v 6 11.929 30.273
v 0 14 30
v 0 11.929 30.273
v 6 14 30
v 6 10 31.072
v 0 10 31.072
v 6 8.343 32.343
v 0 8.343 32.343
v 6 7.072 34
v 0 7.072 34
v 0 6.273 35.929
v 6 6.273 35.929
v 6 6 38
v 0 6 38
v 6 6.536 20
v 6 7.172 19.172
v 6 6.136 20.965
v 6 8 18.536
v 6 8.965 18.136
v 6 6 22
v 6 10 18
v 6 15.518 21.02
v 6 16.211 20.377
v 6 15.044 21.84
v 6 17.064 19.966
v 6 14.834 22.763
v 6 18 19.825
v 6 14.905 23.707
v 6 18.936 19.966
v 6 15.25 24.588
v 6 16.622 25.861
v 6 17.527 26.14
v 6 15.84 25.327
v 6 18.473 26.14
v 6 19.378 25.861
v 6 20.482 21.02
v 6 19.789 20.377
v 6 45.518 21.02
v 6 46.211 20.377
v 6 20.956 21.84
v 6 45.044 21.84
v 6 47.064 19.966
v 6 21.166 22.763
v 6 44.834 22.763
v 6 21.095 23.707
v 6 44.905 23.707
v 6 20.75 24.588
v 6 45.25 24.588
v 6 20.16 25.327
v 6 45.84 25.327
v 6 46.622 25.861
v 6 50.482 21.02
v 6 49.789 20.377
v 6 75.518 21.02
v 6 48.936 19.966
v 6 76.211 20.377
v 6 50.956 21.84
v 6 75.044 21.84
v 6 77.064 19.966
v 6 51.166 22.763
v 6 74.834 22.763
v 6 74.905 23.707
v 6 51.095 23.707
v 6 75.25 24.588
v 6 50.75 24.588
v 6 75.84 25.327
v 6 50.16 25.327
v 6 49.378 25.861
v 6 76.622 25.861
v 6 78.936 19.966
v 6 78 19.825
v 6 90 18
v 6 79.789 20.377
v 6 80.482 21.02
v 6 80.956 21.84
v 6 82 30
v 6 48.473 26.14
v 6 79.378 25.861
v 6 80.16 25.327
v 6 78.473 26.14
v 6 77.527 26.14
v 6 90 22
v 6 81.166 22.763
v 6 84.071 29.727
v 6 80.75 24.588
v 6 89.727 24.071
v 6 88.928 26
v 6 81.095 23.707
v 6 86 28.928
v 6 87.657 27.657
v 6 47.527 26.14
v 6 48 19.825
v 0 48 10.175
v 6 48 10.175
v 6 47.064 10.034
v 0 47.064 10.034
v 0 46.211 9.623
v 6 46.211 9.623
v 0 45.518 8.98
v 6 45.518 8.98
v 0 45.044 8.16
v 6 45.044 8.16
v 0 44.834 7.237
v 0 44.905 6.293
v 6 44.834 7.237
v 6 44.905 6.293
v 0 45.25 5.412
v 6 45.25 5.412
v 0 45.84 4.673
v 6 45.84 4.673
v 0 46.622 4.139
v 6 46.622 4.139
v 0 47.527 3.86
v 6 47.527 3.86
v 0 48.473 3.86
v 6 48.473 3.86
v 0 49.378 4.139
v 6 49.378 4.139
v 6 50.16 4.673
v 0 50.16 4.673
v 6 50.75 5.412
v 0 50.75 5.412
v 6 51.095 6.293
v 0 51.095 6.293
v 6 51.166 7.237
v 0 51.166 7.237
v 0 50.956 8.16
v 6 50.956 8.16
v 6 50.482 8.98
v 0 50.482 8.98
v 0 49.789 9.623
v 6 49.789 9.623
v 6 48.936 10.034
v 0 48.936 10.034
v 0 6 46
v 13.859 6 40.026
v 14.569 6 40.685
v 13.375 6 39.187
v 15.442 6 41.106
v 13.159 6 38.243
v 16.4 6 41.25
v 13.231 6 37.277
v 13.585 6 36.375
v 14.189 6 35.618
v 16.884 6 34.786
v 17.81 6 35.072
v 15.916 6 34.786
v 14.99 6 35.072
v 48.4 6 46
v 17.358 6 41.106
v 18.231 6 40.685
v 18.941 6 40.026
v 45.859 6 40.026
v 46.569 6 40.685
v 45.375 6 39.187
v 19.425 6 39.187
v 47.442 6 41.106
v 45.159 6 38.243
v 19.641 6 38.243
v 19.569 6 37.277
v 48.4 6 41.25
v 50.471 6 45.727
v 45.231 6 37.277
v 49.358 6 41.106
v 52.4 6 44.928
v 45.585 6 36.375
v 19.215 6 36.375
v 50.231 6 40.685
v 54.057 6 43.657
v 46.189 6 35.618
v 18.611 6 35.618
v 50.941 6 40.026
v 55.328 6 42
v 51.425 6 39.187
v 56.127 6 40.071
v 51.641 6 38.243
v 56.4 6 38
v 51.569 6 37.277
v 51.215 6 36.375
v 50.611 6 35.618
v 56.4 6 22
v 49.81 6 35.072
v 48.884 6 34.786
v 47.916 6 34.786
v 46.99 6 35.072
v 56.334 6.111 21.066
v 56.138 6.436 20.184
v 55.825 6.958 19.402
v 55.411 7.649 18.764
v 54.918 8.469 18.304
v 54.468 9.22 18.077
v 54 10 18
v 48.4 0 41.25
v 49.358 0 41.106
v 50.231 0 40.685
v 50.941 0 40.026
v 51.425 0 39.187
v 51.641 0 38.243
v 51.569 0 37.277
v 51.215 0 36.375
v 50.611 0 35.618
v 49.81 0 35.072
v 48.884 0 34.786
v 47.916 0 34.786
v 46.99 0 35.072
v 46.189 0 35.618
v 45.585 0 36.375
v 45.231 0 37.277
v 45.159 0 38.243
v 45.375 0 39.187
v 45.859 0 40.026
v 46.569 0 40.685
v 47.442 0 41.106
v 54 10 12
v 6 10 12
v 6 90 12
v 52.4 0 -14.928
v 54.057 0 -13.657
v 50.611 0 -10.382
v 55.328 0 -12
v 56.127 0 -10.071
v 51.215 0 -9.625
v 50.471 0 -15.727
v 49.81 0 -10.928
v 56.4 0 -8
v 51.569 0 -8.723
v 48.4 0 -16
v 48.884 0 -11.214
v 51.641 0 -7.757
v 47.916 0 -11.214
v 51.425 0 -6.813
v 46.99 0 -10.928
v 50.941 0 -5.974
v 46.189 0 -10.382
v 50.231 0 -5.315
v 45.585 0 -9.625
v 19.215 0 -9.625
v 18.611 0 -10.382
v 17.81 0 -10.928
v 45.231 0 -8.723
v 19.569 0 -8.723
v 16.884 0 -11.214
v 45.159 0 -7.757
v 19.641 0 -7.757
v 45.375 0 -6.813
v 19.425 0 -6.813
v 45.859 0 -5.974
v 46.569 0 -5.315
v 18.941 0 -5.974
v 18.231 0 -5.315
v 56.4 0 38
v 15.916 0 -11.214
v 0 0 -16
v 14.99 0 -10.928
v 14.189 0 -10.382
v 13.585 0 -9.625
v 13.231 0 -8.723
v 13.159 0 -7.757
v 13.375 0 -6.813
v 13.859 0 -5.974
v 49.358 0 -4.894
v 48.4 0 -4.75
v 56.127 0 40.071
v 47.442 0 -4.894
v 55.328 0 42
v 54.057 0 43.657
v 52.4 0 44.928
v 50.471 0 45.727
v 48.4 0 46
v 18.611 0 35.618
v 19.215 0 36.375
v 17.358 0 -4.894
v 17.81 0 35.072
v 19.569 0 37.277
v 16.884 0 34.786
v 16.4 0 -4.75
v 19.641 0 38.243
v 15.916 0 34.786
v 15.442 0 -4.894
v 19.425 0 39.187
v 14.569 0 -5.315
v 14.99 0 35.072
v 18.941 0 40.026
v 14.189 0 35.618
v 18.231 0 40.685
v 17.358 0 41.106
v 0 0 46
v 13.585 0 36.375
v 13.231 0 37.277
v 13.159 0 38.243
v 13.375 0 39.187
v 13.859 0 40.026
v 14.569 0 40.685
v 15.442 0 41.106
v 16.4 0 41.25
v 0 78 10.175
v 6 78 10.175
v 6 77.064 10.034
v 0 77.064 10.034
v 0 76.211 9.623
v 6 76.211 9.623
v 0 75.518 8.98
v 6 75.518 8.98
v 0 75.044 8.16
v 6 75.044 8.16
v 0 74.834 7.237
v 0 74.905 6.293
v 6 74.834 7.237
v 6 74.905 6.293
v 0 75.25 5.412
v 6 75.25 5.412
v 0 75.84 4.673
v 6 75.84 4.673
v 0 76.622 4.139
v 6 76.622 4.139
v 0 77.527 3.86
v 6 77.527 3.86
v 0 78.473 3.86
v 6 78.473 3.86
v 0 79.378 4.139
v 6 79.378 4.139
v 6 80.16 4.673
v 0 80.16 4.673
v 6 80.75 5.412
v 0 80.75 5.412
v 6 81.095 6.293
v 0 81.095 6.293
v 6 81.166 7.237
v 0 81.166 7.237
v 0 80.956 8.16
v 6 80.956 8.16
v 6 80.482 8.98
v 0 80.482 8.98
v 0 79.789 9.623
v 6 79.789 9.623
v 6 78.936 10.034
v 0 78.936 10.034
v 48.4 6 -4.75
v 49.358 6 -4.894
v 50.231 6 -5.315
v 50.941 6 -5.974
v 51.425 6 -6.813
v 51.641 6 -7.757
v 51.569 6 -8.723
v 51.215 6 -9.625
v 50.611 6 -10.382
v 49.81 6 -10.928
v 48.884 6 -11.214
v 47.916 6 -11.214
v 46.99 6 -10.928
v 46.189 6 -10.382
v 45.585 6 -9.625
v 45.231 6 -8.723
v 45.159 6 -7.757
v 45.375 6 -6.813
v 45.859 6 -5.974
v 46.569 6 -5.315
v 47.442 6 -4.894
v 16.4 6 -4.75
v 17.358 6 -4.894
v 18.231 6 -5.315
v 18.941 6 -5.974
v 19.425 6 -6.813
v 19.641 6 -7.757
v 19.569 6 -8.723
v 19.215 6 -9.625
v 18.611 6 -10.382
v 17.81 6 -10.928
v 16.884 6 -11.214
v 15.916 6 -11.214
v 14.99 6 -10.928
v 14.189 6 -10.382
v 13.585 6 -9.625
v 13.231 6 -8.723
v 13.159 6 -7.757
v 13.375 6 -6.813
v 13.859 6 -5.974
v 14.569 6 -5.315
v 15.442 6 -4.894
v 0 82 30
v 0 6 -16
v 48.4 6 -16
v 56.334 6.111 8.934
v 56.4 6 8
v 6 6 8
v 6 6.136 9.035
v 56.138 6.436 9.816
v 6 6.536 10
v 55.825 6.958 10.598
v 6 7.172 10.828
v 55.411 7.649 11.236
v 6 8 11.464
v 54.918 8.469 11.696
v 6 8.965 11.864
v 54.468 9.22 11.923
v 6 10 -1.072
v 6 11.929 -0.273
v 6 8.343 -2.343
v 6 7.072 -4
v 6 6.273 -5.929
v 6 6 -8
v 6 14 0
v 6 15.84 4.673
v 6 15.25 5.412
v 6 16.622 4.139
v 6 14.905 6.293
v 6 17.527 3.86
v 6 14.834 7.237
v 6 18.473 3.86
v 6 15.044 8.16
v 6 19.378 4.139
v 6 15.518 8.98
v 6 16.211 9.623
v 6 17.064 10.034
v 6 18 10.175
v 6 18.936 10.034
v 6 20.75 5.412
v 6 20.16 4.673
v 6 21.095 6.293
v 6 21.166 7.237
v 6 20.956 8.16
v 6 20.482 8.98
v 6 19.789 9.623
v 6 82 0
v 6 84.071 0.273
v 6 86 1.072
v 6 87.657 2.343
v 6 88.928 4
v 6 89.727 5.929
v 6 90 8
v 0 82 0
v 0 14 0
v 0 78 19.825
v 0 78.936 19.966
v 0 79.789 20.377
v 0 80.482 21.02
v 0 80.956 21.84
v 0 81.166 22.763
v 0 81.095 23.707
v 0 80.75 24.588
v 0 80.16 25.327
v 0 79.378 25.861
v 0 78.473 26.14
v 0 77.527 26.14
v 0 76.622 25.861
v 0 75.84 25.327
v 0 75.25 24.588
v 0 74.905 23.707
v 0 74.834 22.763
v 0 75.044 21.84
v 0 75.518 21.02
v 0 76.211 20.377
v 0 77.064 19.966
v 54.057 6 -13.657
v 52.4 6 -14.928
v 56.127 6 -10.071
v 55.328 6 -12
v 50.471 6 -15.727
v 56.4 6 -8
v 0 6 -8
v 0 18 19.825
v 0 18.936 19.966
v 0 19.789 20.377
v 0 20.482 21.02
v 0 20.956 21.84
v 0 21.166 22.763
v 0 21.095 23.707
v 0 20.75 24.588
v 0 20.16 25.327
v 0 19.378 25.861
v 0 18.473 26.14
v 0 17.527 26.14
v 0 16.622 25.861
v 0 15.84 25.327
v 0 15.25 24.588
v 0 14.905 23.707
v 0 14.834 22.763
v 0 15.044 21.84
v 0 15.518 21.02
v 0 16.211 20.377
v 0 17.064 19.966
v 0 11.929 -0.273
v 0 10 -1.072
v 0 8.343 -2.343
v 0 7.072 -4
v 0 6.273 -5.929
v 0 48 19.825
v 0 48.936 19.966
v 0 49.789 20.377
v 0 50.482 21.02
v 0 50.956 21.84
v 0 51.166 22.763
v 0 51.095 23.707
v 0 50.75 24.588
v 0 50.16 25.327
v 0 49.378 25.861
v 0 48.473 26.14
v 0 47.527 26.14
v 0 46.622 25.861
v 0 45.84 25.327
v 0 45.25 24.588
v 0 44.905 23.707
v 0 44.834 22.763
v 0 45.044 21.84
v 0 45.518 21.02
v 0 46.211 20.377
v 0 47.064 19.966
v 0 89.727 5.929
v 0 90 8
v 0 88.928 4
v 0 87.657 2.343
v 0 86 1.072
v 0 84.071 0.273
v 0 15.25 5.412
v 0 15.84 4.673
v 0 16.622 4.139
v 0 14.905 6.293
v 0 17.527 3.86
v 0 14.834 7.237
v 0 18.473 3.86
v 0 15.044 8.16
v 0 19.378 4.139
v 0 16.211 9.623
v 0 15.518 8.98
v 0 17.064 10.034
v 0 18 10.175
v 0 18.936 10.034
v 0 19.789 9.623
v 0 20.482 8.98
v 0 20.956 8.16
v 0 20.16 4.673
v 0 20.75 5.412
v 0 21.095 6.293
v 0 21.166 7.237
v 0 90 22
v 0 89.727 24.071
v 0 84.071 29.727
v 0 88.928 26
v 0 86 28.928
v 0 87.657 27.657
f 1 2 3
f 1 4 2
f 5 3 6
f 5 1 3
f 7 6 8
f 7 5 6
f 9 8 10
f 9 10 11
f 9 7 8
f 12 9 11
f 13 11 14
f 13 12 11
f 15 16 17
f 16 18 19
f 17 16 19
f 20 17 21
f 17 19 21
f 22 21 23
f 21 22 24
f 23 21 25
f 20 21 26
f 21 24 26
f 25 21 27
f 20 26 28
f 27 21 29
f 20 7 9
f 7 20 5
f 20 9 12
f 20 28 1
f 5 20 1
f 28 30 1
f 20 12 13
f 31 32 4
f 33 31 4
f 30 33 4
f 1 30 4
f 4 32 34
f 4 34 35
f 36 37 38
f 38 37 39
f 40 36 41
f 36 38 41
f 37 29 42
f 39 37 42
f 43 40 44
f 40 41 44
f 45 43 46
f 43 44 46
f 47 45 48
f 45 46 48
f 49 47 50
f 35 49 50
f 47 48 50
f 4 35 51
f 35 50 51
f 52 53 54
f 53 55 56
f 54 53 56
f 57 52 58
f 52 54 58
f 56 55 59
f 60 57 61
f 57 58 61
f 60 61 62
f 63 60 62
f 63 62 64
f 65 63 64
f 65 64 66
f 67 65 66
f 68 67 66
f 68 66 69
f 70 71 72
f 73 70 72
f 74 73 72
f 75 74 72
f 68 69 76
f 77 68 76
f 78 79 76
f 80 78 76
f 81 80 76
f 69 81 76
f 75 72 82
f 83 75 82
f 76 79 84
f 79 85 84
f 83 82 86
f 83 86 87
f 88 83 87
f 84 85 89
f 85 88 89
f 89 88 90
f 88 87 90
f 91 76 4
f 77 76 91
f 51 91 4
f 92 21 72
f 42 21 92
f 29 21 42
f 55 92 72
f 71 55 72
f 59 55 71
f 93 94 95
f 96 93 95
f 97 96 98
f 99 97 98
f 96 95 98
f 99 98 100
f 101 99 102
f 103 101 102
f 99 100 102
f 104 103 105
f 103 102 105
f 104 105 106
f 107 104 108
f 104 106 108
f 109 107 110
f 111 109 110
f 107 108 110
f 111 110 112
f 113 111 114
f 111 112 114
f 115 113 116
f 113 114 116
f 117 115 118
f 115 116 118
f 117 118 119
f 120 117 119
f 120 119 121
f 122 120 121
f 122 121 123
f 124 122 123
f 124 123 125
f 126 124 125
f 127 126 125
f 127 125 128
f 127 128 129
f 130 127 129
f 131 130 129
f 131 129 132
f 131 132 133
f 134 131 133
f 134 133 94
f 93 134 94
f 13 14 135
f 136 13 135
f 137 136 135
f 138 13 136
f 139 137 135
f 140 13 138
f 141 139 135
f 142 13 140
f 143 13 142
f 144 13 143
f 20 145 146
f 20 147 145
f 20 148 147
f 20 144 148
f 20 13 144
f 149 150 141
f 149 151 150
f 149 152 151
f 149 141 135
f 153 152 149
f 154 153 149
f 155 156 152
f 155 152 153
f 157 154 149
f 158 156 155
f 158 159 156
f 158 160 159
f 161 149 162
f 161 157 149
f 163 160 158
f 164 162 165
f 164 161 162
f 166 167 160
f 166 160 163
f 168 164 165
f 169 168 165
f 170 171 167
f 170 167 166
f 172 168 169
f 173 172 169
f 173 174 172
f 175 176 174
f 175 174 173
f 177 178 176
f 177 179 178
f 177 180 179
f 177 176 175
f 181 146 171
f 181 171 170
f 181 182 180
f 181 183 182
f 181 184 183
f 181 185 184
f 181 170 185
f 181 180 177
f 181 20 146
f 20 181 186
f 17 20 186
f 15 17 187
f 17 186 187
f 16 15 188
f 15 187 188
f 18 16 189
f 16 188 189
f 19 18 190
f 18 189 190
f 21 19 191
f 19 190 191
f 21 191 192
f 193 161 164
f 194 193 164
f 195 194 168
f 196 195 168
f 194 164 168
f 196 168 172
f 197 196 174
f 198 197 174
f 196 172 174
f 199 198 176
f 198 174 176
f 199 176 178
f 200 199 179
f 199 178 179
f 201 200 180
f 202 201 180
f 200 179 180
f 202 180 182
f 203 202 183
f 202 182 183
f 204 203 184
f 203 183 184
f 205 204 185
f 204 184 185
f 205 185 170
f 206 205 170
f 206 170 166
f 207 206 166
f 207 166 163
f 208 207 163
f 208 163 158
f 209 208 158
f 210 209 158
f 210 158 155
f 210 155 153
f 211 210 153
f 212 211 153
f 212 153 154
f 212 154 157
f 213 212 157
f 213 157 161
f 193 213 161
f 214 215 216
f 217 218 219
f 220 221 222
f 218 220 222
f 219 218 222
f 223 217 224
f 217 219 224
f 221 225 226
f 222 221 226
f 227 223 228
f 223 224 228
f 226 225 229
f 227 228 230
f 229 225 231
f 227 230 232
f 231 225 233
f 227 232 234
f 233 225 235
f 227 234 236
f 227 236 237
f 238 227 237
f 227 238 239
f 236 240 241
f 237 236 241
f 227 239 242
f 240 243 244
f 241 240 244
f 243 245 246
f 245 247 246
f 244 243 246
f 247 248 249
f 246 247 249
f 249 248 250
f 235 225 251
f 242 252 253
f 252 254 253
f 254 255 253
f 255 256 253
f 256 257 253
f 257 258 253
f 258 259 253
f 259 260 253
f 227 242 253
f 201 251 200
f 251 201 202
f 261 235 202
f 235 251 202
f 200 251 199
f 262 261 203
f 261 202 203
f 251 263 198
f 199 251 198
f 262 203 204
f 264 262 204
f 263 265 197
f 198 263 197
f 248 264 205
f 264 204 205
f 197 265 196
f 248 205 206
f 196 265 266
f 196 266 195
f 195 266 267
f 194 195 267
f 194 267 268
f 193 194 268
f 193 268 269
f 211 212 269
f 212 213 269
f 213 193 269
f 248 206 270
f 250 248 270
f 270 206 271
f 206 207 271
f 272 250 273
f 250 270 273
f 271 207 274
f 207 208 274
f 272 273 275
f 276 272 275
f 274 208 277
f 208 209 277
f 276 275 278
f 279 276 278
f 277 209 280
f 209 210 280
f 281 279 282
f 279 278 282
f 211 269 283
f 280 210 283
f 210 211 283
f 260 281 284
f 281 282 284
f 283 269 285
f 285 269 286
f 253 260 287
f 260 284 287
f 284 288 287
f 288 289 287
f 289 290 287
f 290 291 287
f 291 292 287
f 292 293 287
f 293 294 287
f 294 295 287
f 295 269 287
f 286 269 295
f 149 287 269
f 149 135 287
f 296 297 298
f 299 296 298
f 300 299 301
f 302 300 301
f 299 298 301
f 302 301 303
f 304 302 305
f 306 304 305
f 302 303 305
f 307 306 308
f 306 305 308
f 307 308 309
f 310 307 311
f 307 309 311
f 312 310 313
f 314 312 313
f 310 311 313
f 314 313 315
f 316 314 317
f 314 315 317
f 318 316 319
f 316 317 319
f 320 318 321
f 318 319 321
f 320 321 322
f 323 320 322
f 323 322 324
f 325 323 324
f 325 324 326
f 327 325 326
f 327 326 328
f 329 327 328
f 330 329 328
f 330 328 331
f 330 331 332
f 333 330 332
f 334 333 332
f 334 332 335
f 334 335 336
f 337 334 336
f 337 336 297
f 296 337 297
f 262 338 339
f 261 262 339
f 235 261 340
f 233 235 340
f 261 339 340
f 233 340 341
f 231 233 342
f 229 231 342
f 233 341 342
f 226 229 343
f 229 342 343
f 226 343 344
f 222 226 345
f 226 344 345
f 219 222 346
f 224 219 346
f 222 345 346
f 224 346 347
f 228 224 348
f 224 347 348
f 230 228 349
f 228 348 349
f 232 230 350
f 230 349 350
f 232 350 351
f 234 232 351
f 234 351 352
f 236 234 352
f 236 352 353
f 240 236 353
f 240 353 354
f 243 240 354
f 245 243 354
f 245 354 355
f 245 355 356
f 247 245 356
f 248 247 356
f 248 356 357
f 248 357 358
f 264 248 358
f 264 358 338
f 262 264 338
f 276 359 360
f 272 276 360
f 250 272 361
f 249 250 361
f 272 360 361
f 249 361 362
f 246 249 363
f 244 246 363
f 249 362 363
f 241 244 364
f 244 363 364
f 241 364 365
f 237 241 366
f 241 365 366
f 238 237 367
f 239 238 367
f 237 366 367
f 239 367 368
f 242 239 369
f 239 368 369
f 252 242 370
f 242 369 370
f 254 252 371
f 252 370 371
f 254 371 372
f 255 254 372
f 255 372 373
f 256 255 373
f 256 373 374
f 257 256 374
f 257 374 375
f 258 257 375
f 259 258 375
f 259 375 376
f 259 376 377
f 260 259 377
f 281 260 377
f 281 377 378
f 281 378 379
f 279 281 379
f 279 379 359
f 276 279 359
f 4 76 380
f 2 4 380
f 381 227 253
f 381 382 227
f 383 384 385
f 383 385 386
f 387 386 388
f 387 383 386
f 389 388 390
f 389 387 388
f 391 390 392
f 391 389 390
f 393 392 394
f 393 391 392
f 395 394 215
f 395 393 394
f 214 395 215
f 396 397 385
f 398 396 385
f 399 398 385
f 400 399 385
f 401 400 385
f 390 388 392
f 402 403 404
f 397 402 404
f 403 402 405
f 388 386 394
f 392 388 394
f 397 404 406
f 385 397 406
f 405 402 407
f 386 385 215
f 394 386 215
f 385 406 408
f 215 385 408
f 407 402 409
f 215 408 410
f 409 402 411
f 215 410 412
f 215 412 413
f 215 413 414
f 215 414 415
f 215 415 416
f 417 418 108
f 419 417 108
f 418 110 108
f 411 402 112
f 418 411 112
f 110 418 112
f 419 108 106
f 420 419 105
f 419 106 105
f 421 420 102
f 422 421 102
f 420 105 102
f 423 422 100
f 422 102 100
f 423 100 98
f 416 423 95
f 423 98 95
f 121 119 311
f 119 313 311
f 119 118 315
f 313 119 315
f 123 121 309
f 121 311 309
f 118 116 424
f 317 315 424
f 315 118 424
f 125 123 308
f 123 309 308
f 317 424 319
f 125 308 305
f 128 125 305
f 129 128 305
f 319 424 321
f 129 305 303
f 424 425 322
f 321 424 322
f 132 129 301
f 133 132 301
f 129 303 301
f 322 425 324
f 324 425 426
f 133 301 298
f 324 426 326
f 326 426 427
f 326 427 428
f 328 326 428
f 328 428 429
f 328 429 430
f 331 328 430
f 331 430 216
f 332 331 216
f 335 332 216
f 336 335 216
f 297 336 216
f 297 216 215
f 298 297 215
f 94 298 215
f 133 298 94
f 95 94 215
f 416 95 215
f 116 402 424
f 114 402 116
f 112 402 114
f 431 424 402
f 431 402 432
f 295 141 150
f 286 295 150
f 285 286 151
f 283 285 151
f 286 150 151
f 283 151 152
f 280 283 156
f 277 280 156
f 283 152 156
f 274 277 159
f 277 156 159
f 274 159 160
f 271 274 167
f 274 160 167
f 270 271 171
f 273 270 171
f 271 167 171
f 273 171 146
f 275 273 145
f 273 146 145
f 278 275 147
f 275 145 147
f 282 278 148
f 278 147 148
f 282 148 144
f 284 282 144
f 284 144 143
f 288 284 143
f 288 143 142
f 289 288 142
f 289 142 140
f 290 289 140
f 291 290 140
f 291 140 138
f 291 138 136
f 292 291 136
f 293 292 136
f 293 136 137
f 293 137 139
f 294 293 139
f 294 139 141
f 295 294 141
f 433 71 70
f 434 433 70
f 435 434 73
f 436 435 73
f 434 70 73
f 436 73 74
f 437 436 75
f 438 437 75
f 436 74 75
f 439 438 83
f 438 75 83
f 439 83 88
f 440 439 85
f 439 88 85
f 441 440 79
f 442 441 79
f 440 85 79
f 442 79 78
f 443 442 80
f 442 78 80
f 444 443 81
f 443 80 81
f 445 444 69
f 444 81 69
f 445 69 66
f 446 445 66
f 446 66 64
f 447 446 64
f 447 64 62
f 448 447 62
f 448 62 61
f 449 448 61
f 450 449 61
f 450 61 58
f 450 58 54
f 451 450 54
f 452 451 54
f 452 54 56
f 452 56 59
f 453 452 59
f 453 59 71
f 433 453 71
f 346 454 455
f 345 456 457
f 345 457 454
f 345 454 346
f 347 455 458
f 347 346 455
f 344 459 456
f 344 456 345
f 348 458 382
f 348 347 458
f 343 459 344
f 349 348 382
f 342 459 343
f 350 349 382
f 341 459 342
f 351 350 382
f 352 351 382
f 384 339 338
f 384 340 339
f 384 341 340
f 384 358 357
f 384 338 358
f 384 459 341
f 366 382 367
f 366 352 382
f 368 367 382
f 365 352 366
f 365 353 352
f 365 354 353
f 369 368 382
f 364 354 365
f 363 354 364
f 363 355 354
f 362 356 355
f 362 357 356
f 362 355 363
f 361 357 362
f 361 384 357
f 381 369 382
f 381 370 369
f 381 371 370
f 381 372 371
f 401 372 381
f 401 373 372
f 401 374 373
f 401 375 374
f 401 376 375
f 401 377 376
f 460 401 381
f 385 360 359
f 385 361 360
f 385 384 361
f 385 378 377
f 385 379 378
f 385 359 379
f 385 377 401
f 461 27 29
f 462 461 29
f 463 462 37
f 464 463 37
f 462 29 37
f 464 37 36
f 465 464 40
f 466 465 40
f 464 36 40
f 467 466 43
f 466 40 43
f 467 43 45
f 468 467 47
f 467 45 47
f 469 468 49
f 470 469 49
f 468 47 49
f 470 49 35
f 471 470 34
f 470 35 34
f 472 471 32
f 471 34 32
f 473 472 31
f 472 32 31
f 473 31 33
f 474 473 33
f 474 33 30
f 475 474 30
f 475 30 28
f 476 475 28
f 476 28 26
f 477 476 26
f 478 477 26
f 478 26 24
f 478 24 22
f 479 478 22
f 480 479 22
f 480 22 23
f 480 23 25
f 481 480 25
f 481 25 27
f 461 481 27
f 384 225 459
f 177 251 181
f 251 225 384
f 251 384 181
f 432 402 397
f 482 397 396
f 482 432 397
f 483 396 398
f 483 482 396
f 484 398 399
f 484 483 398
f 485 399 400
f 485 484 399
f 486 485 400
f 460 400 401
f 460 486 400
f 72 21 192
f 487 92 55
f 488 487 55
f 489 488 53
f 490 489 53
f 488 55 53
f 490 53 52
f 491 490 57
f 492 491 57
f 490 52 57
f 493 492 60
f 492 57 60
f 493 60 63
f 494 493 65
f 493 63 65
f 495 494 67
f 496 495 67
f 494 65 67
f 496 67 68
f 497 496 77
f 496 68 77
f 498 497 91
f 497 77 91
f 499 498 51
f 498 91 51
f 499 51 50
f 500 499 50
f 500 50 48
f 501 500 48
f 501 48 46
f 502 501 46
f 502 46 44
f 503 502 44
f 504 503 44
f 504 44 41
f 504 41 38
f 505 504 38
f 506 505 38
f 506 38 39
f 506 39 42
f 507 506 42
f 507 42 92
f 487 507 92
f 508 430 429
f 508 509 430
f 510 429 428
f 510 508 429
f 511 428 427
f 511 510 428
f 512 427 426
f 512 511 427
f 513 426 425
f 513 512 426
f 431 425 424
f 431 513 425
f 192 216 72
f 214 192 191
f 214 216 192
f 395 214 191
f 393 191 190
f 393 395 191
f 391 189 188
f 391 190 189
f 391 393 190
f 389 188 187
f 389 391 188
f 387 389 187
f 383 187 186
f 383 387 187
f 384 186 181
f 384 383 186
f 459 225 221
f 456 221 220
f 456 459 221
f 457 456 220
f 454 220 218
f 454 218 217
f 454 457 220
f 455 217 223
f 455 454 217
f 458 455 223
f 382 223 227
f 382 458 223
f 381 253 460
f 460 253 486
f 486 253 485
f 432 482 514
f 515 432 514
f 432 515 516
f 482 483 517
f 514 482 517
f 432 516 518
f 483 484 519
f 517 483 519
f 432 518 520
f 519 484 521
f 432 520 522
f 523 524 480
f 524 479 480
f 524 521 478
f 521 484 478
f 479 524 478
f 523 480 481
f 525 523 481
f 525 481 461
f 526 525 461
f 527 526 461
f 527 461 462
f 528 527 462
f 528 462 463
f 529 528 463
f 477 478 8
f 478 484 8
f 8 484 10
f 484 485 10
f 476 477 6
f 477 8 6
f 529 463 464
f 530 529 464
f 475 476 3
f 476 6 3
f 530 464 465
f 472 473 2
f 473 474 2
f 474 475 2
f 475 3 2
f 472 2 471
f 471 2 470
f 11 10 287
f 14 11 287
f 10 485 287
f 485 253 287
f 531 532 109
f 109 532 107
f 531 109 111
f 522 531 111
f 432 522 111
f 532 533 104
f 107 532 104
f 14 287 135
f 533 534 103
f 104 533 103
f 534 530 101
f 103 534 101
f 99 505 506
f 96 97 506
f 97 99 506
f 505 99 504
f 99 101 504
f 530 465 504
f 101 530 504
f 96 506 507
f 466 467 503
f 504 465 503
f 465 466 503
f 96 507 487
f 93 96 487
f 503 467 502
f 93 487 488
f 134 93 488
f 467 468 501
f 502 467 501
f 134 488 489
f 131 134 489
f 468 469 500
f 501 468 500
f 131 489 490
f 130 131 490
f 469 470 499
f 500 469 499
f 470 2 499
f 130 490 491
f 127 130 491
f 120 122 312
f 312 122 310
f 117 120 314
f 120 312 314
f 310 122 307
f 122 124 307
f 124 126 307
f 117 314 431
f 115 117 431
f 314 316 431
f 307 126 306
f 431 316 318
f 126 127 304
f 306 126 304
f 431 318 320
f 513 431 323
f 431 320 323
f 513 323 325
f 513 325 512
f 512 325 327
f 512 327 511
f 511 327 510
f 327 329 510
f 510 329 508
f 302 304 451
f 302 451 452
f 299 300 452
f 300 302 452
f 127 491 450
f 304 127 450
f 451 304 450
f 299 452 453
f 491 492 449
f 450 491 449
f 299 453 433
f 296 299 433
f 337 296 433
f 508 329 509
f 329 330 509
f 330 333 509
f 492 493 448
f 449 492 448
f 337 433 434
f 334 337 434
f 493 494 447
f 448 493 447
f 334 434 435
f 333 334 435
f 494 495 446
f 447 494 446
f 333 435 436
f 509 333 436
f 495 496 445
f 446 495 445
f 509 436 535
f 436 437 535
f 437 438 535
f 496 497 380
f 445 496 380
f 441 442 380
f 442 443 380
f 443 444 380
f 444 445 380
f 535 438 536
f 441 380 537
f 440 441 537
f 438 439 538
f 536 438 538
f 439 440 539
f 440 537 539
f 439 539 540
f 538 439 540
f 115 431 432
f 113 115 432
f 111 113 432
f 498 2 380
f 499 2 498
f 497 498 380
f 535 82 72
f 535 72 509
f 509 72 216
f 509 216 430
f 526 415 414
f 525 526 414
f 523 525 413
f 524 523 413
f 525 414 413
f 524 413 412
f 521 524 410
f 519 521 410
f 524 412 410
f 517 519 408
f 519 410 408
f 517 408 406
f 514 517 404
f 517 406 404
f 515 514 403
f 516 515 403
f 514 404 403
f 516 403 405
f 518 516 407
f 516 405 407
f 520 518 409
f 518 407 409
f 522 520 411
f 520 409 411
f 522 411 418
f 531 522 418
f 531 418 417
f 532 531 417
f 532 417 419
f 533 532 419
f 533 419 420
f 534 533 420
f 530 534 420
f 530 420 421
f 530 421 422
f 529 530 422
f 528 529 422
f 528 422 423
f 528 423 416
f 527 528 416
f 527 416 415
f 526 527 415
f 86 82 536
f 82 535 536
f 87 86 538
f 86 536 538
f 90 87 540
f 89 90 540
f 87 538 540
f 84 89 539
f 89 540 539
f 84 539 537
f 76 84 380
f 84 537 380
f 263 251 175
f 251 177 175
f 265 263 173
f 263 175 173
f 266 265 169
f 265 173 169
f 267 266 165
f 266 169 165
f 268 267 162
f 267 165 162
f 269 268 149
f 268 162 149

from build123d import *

# Parameters (mm, degrees)
RESSALTO_EXTRUS_O1_DEPTH = 30
ESBO_O2_W                = 12
ESBO_O2_H                = 94
CORTE_EXTRUS_O1_DEPTH    = 118.541482039
ESBO_O3_W                = 30
ESBO_O3_H                = 10
CORTE_EXTRUS_O2_DEPTH    = 118.541482039
ESBO_O4_W                = 3.6
ESBO_O4_H                = 30
CORTE_EXTRUS_O3_DEPTH    = 108.498837203
ESBO_O5_W                = 56.4
ESBO_O5_H                = 6
RESSALTO_EXTRUS_O2_DEPTH = 16
ESBO_O6_W                = 56.4
ESBO_O6_H                = 6
RESSALTO_EXTRUS_O3_DEPTH = 16
FILETE1_R                = 8
FILETE2_R                = 8
FILETE3_R                = 8
FILETE4_R                = 4
ESBO_O7_R                = 3.175
CORTE_EXTRUS_O4_DEPTH    = 113.943171551
ESBO_O8_R                = 3.25
CORTE_EXTRUS_O5_DEPTH    = 112.143870726


with BuildPart() as part:
    # Esboço1 → Ressalto-extrusão1 (new body)
    with BuildSketch(Plane.XY):
        Polygon((0, 0), (0, 100), (60, 0), align=None)
    extrude(amount=RESSALTO_EXTRUS_O1_DEPTH)

    # Esboço2 → Corte-extrusão1 (cut, through all)
    with BuildSketch(Plane.ZY.offset(-6)):
        with Locations((24, 53)):
            Rectangle(ESBO_O2_W, ESBO_O2_H)
        with Locations((6, 53)):
            Rectangle(ESBO_O2_W, ESBO_O2_H)
    extrude(amount=-CORTE_EXTRUS_O1_DEPTH, mode=Mode.SUBTRACT)

    # Esboço3 → Corte-extrusão2 (cut, through all)
    with BuildSketch(Plane(origin=(6, 0, 0), x_dir=(0, 0, -1), z_dir=(1, 0, 0))):
        with Locations((-15, 95)):
            Rectangle(ESBO_O3_W, ESBO_O3_H)
    extrude(amount=-CORTE_EXTRUS_O2_DEPTH, mode=Mode.SUBTRACT)

    # Esboço4 → Corte-extrusão3 (cut, through all)
    with BuildSketch(Plane(origin=(0, 6, 0), x_dir=(1, 0, 0), z_dir=(0, 1, 0))):
        with Locations((58.2, -15)):
            Rectangle(ESBO_O4_W, ESBO_O4_H)
    extrude(amount=-CORTE_EXTRUS_O3_DEPTH, mode=Mode.SUBTRACT)

    # Esboço5 → Ressalto-extrusão2 (add)
    with BuildSketch(Plane.XY.offset(30)):
        with Locations((28.2, 3)):
            Rectangle(ESBO_O5_W, ESBO_O5_H)
    extrude(amount=RESSALTO_EXTRUS_O2_DEPTH)

    # Esboço6 → Ressalto-extrusão3 (add)
    with BuildSketch(Plane(origin=(0, 0, 0), x_dir=(-1, 0, 0), z_dir=(0, 0, -1))):
        with Locations((-28.2, 3)):
            Rectangle(ESBO_O6_W, ESBO_O6_H)
    extrude(amount=RESSALTO_EXTRUS_O3_DEPTH)

    # Filete1
    filete1_edges = [part.edges().sort_by_distance(p)[0] for p in [
        (3, 6, 0),
        (3, 6, 30),
    ]]
    fillet(filete1_edges, radius=FILETE1_R)

    # Filete2
    filete2_edges = [part.edges().sort_by_distance(p)[0] for p in [
        (56.4, 3, -16),
        (56.4, 3, 46),
    ]]
    fillet(filete2_edges, radius=FILETE2_R)

    # Filete3
    filete3_edges = [part.edges().sort_by_distance(p)[0] for p in [
        (3, 90, 30),
        (3, 90, 0),
    ]]
    fillet(filete3_edges, radius=FILETE3_R)

    # Filete4
    filete4_edges = [part.edges().sort_by_distance(p)[0] for p in [
        (31.2, 6, 18),
        (31.2, 6, 12),
    ]]
    fillet(filete4_edges, radius=FILETE4_R)

    # Esboço7 → Corte-extrusão4 (cut, through all)
    with BuildSketch(Plane(origin=(6, 0, 0), x_dir=(0, 0, -1), z_dir=(1, 0, 0))):
        with Locations((-23, 78)):
            Circle(ESBO_O7_R)
        with Locations((-23, 48)):
            Circle(ESBO_O7_R)
        with Locations((-23, 18)):
            Circle(ESBO_O7_R)
        with Locations(Location((-7, 18, 0), (0, 0, 180))):
            Circle(ESBO_O7_R)
        with Locations(Location((-7, 48, 0), (0, 0, 180))):
            Circle(ESBO_O7_R)
        with Locations(Location((-7, 78, 0), (0, 0, 180))):
            Circle(ESBO_O7_R)
    extrude(amount=-CORTE_EXTRUS_O4_DEPTH, mode=Mode.SUBTRACT)

    # Esboço8 → Corte-extrusão5 (cut, through all)
    with BuildSketch(Plane(origin=(0, 6, 0), x_dir=(1, 0, 0), z_dir=(0, 1, 0))):
        with Locations(Location((48.4, 8, 0), (0, 0, 270))):
            Circle(ESBO_O8_R)
        with Locations(Location((48.4, -38, 0), (0, 0, 270))):
            Circle(ESBO_O8_R)
        with Locations(Location((16.4, -38, 0), (0, 0, 270))):
            Circle(ESBO_O8_R)
        with Locations(Location((16.4, 8, 0), (0, 0, 270))):
            Circle(ESBO_O8_R)
    extrude(amount=-CORTE_EXTRUS_O5_DEPTH, mode=Mode.SUBTRACT)


solid = part.part
